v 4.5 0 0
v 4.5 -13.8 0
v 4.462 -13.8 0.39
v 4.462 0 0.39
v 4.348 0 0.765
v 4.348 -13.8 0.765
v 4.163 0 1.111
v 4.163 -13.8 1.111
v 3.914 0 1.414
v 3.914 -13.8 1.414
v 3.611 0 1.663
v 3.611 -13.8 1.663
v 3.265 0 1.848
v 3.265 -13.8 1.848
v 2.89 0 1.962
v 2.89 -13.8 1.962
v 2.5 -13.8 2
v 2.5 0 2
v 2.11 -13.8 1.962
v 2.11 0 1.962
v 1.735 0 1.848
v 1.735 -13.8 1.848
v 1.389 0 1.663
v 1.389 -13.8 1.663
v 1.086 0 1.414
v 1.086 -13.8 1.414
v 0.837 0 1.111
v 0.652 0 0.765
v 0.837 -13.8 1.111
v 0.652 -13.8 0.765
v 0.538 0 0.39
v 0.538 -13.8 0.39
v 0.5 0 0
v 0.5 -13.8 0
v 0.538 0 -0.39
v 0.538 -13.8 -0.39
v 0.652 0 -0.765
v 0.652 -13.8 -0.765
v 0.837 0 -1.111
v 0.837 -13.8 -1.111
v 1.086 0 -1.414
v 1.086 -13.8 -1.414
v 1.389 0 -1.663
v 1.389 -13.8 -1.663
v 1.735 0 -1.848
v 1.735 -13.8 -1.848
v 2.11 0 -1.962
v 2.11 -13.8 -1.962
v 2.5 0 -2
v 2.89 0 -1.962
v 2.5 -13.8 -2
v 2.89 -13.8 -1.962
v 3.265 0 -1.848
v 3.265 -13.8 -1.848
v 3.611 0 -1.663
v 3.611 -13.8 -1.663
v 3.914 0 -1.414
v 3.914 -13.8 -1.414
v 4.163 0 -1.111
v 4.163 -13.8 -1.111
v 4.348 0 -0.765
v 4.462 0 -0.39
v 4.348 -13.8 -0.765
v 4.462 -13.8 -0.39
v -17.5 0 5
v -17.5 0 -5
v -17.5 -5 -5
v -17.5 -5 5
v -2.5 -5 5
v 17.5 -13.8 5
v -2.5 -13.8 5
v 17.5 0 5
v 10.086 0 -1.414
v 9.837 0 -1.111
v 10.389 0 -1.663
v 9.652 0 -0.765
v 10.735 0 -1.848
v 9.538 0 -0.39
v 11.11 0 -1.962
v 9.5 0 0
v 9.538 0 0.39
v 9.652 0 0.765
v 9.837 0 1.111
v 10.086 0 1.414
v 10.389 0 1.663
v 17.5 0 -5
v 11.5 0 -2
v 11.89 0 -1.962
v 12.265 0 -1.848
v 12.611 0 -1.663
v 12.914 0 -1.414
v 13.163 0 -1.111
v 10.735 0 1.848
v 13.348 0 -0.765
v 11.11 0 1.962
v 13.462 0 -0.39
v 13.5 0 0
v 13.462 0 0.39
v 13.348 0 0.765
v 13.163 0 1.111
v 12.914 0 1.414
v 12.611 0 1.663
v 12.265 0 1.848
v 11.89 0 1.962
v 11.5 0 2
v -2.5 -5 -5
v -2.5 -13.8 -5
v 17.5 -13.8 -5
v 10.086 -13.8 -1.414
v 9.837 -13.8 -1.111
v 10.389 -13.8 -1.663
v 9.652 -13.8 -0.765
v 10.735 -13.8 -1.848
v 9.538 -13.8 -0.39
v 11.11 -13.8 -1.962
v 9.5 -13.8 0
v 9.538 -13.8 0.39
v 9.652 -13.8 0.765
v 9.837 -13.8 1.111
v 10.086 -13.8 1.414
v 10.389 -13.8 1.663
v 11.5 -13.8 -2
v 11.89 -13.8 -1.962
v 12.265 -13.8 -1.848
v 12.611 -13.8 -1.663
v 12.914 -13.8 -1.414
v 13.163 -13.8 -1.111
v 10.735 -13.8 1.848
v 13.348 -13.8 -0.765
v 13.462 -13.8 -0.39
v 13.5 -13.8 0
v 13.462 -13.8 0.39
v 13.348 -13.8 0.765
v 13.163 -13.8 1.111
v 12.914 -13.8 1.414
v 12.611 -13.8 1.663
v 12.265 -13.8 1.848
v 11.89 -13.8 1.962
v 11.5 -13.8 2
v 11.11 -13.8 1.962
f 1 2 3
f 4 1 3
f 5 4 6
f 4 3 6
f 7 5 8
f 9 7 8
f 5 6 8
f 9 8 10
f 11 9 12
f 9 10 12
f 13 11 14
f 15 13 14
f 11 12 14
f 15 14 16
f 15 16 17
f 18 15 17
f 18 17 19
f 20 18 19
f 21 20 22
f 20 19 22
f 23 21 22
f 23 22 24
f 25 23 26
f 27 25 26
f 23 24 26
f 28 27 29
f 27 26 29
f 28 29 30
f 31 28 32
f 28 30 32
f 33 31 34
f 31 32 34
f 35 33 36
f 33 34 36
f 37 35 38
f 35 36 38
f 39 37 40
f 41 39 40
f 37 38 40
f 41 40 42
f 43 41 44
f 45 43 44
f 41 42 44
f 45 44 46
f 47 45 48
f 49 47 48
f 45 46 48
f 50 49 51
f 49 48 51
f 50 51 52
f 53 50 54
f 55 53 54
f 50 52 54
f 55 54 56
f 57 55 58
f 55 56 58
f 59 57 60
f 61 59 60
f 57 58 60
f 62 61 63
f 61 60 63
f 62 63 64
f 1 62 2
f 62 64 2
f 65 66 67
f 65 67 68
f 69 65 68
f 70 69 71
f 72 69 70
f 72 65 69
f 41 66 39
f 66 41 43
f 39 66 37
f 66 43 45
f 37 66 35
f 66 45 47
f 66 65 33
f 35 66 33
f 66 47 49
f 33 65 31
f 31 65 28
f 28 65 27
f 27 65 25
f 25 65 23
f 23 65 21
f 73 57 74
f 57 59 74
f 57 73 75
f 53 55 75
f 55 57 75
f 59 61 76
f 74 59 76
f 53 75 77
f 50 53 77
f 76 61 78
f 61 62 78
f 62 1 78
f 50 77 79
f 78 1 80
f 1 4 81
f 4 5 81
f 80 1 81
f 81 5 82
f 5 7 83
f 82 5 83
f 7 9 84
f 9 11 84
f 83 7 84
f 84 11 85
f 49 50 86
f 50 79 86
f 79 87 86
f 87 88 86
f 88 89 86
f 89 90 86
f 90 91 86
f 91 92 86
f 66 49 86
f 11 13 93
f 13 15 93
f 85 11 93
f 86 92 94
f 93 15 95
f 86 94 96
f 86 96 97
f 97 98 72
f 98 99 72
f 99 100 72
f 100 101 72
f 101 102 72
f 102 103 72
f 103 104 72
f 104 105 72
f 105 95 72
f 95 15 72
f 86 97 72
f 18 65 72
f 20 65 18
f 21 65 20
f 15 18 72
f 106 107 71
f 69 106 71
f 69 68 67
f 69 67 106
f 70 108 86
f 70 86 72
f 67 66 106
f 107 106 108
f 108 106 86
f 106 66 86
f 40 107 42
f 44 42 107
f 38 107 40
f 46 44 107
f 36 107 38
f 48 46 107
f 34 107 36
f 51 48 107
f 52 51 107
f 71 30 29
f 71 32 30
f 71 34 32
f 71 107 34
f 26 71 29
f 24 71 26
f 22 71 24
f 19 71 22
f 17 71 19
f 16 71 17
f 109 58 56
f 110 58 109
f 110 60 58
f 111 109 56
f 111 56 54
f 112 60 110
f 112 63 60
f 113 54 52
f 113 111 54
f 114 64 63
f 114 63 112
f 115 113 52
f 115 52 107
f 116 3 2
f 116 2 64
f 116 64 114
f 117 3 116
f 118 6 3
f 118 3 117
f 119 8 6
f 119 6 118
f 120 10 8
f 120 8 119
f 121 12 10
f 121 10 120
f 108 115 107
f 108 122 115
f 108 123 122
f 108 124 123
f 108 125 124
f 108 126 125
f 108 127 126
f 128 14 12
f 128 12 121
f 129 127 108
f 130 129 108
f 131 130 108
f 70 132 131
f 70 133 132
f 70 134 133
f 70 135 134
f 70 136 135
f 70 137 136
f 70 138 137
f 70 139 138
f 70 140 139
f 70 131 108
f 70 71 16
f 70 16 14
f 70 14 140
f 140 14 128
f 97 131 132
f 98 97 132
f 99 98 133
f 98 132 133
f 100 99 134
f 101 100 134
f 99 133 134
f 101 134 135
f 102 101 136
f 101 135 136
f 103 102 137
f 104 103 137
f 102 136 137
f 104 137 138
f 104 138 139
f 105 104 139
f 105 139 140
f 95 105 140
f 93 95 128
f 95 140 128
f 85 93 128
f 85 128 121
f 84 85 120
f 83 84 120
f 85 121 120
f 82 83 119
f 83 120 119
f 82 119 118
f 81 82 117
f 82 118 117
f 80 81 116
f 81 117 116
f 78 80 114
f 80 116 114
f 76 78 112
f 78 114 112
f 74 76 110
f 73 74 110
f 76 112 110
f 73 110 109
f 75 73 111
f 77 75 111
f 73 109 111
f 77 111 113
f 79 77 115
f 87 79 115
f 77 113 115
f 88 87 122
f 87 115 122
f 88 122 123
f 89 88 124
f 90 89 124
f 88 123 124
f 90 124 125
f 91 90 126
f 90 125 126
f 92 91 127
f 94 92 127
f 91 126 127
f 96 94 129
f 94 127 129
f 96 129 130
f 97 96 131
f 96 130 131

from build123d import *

# Parameters (mm, degrees)
F0_W     = 35
F0_H     = 10
F1_DEPTH = 13.8
F2_W     = 15
F2_H     = 10
F3_DEPTH = 8.8
F4_R     = 2
F5_DEPTH = 13.8


with BuildPart() as f1:
    # F0 (on Front) → F1 (new body)
    with BuildSketch(Plane.XZ):
        Rectangle(F0_W, F0_H)
    extrude(amount=F1_DEPTH)

    # F2 (on face) → F3 (cut)
    with BuildSketch(Plane.XZ.offset(13.8)):
        with Locations((-10, 0)):
            Rectangle(F2_W, F2_H)
    extrude(amount=-F3_DEPTH, mode=Mode.SUBTRACT)

    # F4 (on face) → F5 (cut)
    with BuildSketch(Plane.XZ.offset(13.8)):
        with Locations((2.5, 0)):
            Circle(F4_R)
        with Locations((11.5, 0)):
            Circle(F4_R)
    extrude(amount=-F5_DEPTH, mode=Mode.SUBTRACT)


solid = f1.part
